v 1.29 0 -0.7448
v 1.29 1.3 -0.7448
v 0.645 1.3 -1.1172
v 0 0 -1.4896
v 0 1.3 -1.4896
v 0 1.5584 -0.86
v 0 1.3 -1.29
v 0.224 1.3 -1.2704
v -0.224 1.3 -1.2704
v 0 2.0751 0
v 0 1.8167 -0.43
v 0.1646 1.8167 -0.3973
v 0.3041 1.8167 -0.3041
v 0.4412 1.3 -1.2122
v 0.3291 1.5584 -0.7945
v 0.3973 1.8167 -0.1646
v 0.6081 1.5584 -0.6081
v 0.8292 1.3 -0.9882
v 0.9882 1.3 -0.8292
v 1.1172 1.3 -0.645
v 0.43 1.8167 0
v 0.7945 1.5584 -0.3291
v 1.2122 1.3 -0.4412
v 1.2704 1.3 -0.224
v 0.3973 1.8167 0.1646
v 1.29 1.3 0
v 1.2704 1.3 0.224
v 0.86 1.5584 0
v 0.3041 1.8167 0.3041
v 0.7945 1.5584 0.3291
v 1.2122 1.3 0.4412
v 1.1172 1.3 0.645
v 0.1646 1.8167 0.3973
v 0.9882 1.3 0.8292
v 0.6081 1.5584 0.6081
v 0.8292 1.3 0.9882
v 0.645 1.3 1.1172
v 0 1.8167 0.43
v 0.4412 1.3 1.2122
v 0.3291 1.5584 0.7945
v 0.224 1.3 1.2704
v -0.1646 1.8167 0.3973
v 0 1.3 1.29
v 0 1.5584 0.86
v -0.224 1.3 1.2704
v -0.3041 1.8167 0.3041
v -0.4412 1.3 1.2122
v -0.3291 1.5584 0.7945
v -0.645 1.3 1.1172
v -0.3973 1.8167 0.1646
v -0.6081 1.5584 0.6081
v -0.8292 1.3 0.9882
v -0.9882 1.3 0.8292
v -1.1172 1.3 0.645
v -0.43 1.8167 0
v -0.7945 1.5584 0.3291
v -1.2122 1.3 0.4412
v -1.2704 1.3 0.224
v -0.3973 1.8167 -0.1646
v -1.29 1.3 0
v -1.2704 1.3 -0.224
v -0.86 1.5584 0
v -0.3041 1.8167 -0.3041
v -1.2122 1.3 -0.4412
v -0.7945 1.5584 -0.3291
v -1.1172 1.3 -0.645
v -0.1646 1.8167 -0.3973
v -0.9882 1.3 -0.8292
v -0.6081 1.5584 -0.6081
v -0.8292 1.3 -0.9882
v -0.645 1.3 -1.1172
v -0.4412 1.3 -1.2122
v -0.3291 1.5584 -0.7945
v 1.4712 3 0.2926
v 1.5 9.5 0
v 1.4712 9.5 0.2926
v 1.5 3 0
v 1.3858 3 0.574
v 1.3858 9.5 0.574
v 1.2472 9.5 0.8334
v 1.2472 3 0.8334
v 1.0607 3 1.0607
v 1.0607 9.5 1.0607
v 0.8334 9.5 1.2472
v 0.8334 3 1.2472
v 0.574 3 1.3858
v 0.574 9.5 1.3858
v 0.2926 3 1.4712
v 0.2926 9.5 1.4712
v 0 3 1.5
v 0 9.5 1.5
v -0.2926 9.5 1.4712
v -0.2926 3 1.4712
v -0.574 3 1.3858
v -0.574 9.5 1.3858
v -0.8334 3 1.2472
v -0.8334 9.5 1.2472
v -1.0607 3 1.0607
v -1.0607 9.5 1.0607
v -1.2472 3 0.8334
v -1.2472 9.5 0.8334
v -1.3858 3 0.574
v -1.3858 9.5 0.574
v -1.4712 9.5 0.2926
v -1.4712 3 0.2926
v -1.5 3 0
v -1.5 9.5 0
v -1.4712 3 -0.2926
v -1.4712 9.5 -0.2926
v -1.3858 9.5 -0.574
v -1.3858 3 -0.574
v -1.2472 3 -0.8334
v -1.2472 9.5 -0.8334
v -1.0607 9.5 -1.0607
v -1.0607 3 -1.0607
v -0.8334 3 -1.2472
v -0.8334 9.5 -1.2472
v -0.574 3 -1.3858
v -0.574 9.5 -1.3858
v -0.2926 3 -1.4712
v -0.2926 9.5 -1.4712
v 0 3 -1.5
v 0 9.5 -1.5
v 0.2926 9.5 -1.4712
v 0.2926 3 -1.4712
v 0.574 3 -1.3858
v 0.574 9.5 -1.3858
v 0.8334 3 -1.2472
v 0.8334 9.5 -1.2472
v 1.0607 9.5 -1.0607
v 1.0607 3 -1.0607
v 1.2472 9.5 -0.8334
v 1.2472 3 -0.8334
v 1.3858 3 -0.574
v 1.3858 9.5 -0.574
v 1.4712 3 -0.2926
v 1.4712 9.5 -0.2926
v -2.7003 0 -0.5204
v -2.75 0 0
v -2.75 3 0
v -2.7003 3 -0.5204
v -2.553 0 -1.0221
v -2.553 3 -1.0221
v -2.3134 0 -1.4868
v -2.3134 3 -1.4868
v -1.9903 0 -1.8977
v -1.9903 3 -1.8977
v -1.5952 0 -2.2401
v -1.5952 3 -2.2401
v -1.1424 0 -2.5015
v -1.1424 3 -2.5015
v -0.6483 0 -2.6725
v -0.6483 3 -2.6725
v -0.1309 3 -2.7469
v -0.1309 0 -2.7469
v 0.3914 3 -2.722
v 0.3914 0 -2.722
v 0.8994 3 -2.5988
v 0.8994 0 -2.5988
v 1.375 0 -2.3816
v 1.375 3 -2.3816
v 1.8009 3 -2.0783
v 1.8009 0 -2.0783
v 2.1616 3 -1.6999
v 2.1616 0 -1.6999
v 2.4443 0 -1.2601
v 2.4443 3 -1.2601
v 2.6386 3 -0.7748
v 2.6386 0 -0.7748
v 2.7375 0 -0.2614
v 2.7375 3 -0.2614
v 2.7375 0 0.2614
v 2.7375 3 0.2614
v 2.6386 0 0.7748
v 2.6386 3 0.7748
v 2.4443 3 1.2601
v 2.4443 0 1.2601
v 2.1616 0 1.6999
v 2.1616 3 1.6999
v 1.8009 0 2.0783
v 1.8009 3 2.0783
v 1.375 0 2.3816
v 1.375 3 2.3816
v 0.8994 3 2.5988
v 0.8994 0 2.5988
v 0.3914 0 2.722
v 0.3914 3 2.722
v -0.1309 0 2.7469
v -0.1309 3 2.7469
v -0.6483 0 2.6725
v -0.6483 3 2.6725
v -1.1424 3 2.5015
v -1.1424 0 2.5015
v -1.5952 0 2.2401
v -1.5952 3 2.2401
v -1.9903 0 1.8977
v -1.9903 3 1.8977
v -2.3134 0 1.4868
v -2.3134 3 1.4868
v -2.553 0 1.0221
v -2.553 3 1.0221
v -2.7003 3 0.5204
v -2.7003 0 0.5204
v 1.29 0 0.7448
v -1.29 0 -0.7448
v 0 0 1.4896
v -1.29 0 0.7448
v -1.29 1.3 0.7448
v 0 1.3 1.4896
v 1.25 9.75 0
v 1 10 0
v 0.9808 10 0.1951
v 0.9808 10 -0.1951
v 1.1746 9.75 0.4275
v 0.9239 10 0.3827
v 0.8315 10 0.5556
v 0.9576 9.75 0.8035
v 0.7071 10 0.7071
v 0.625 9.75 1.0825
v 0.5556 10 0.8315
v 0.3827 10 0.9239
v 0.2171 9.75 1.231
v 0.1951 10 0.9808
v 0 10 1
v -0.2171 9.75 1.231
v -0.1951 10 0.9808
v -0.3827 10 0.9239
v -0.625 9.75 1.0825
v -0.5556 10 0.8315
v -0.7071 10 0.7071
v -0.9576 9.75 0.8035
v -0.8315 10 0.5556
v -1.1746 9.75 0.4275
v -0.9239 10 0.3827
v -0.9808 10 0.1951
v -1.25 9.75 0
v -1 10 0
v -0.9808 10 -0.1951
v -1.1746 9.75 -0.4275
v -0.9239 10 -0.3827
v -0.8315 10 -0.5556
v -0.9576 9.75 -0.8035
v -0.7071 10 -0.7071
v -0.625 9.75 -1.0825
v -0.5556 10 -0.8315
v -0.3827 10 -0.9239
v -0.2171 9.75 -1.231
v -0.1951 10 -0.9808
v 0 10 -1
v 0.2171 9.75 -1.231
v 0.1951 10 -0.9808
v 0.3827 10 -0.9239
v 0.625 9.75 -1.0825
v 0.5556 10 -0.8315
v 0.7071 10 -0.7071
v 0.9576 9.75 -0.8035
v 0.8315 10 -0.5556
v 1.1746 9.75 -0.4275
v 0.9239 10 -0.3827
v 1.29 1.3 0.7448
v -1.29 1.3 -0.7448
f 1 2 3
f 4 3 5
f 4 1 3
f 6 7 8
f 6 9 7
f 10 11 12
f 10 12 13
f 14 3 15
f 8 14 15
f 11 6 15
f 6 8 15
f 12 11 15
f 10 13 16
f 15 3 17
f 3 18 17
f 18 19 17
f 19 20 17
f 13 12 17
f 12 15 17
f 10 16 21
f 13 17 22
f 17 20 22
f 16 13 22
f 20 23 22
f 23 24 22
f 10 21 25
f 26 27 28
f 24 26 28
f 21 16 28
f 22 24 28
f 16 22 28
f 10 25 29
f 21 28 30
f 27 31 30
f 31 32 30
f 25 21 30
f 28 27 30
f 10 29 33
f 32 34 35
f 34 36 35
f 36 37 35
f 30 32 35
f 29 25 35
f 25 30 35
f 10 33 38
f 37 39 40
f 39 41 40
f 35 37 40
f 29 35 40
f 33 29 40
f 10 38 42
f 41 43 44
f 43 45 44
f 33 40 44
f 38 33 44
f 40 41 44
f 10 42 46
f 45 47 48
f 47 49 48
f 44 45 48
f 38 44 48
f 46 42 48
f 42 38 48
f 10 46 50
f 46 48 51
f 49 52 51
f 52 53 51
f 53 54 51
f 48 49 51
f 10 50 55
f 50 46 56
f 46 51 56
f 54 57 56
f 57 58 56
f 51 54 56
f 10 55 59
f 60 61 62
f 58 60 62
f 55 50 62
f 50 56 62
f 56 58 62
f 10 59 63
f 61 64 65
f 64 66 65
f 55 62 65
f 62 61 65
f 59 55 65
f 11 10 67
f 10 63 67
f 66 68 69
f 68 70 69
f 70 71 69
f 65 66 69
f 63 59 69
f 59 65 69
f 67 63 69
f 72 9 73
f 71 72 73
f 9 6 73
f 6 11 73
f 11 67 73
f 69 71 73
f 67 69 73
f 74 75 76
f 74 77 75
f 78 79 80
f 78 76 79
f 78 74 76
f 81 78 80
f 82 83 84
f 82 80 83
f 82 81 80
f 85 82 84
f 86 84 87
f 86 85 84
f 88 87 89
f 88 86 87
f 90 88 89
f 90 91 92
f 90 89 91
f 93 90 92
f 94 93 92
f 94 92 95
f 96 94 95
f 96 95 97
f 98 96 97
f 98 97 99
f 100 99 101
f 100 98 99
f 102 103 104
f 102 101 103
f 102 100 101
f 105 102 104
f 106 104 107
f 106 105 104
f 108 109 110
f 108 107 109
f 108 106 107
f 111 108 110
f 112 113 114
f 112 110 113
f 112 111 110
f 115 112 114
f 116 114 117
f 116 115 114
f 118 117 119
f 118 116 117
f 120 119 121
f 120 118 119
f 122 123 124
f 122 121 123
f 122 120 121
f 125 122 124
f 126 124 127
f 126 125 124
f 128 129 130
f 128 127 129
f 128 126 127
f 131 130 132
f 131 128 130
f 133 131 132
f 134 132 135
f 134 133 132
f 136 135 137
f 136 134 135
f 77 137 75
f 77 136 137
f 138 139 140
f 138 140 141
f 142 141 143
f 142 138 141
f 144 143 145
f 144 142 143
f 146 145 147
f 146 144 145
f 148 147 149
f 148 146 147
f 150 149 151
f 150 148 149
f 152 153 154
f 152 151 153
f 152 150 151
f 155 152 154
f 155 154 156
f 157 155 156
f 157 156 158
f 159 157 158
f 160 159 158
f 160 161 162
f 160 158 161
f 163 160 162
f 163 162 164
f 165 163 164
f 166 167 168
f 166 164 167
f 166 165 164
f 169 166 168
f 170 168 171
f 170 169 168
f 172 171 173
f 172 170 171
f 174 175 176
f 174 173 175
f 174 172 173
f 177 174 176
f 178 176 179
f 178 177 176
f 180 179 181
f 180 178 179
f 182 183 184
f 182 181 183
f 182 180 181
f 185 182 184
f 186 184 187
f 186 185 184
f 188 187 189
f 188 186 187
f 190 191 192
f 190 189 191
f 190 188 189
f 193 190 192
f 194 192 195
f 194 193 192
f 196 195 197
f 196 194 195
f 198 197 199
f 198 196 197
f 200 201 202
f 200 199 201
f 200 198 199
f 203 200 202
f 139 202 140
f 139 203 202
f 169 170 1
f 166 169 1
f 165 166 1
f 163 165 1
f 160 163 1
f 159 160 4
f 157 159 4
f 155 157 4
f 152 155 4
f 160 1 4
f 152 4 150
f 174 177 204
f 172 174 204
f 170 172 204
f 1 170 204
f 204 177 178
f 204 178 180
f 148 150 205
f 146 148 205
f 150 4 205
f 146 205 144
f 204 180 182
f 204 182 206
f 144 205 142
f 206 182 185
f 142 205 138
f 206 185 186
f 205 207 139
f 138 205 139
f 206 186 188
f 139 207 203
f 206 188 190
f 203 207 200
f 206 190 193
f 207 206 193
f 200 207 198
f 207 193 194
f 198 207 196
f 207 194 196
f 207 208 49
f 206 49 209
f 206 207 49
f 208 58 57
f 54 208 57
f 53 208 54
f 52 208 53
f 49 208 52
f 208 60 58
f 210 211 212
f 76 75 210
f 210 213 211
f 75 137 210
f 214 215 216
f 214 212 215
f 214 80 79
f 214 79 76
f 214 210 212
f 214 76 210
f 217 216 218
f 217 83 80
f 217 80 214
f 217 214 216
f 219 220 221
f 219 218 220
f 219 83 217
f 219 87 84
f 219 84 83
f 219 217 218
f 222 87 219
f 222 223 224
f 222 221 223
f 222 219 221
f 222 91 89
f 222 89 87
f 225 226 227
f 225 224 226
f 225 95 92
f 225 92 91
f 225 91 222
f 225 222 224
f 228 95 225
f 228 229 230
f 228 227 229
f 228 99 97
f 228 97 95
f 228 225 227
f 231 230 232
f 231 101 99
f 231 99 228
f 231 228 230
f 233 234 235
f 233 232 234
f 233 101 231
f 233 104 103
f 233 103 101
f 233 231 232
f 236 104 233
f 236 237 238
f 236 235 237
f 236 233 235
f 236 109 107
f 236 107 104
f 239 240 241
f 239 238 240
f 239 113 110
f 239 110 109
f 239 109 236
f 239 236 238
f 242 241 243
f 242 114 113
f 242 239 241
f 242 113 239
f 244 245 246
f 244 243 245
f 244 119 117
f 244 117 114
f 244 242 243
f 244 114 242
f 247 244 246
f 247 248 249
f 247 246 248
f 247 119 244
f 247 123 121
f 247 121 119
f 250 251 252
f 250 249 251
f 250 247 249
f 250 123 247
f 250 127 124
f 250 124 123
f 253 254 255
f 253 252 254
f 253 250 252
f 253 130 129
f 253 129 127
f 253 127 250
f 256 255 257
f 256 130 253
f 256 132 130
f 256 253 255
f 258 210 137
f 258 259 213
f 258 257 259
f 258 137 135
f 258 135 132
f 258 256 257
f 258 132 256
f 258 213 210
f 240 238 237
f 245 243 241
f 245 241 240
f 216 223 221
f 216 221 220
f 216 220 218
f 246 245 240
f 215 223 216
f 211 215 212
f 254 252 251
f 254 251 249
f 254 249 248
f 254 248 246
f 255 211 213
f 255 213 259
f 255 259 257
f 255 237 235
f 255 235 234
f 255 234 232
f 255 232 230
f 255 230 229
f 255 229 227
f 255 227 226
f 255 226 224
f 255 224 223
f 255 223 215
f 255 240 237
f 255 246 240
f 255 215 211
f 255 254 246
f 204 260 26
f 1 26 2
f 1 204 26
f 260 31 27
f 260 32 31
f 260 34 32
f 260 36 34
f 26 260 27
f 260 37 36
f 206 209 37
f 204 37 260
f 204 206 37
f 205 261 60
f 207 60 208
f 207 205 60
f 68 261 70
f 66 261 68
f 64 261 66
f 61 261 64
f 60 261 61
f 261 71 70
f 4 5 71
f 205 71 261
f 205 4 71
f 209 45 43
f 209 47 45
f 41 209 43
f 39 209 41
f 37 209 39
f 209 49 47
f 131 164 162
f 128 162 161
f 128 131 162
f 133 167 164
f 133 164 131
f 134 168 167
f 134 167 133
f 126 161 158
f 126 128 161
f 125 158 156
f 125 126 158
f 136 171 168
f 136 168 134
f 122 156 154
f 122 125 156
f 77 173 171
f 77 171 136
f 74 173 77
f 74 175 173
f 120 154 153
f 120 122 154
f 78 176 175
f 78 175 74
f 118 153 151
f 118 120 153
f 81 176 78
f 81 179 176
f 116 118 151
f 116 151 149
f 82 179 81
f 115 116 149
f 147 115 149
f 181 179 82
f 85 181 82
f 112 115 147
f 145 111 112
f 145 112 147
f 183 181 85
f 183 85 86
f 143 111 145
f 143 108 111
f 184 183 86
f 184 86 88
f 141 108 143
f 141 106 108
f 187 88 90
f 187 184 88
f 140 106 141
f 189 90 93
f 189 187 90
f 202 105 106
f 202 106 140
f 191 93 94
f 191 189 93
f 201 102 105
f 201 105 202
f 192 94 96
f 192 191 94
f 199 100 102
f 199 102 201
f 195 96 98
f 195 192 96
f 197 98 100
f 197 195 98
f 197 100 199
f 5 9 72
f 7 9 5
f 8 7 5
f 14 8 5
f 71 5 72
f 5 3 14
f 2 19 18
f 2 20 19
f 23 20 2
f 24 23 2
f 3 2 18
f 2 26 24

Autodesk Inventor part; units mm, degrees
ref_plane "YZ Plane" through (0, 0, 0) normal (1, 0, 0) x (0, 1, 0)
ref_plane "XZ Plane" through (0, 0, 0) normal (0, 1, 0) x (-1, 0, 0)
ref_plane "XY Plane" through (0, 0, 0) normal (0, 0, 1) x (1, 0, 0)
sketch "Boceto1" plane through (0, 0, 0) normal (0, 1, 0) x (-1, 0, 0)
  circle A0 centre (0, 0) radius 2.75
  dimension "d0" = 5.5
extrude "Extrusión1" add sketch "Boceto1" along normal blind 3
sketch "Boceto2" plane through (0, 0, 0) normal (0, -1, 0) x (1, 0, 0)
  point P0 (0, 0)
  point P1 (0, 0)
hole "Agujero1" at (0, 0, 0) direction (0, 1, 0) diameter 2.58 depth 1.3 tip angle 118
sketch "Boceto3" plane through (0, 0, 0) normal (0, -1, 0) x (1, 0, 0)
  circle A0 centre (0, 0) radius 1.29 projected
  line L0 (0, 1.4896) -> (1.29, 0.7448)
  line L1 (1.29, 0.7448) -> (1.29, -0.7448)
  line L2 (1.29, -0.7448) -> (0, -1.4896)
  line L3 (0, -1.4896) -> (-1.29, -0.7448)
  line L4 (-1.29, -0.7448) -> (-1.29, 0.7448)
  line L5 (-1.29, 0.7448) -> (0, 1.4896)
extrude "Extrusión2" cut sketch "Boceto3" against normal blind 1.3
sketch "Boceto4" plane through (0, 3, 0) normal (0, 1, 0) x (1, 0, 0)
  circle A0 centre (0, 0) radius 1.5
  dimension "d12" = 3
extrude "Extrusión3" add sketch "Boceto4" along normal blind 7
thread "Rosca1" size "M3x0.5" class "6g" standard "ANSI Metric M Profile" full length
chamfer "Chaflán1" distance 0.5 angle 45 1 edges at (-1.5, 10, 0)
properties part number "TornilloM3" material "Hierro, gris"
